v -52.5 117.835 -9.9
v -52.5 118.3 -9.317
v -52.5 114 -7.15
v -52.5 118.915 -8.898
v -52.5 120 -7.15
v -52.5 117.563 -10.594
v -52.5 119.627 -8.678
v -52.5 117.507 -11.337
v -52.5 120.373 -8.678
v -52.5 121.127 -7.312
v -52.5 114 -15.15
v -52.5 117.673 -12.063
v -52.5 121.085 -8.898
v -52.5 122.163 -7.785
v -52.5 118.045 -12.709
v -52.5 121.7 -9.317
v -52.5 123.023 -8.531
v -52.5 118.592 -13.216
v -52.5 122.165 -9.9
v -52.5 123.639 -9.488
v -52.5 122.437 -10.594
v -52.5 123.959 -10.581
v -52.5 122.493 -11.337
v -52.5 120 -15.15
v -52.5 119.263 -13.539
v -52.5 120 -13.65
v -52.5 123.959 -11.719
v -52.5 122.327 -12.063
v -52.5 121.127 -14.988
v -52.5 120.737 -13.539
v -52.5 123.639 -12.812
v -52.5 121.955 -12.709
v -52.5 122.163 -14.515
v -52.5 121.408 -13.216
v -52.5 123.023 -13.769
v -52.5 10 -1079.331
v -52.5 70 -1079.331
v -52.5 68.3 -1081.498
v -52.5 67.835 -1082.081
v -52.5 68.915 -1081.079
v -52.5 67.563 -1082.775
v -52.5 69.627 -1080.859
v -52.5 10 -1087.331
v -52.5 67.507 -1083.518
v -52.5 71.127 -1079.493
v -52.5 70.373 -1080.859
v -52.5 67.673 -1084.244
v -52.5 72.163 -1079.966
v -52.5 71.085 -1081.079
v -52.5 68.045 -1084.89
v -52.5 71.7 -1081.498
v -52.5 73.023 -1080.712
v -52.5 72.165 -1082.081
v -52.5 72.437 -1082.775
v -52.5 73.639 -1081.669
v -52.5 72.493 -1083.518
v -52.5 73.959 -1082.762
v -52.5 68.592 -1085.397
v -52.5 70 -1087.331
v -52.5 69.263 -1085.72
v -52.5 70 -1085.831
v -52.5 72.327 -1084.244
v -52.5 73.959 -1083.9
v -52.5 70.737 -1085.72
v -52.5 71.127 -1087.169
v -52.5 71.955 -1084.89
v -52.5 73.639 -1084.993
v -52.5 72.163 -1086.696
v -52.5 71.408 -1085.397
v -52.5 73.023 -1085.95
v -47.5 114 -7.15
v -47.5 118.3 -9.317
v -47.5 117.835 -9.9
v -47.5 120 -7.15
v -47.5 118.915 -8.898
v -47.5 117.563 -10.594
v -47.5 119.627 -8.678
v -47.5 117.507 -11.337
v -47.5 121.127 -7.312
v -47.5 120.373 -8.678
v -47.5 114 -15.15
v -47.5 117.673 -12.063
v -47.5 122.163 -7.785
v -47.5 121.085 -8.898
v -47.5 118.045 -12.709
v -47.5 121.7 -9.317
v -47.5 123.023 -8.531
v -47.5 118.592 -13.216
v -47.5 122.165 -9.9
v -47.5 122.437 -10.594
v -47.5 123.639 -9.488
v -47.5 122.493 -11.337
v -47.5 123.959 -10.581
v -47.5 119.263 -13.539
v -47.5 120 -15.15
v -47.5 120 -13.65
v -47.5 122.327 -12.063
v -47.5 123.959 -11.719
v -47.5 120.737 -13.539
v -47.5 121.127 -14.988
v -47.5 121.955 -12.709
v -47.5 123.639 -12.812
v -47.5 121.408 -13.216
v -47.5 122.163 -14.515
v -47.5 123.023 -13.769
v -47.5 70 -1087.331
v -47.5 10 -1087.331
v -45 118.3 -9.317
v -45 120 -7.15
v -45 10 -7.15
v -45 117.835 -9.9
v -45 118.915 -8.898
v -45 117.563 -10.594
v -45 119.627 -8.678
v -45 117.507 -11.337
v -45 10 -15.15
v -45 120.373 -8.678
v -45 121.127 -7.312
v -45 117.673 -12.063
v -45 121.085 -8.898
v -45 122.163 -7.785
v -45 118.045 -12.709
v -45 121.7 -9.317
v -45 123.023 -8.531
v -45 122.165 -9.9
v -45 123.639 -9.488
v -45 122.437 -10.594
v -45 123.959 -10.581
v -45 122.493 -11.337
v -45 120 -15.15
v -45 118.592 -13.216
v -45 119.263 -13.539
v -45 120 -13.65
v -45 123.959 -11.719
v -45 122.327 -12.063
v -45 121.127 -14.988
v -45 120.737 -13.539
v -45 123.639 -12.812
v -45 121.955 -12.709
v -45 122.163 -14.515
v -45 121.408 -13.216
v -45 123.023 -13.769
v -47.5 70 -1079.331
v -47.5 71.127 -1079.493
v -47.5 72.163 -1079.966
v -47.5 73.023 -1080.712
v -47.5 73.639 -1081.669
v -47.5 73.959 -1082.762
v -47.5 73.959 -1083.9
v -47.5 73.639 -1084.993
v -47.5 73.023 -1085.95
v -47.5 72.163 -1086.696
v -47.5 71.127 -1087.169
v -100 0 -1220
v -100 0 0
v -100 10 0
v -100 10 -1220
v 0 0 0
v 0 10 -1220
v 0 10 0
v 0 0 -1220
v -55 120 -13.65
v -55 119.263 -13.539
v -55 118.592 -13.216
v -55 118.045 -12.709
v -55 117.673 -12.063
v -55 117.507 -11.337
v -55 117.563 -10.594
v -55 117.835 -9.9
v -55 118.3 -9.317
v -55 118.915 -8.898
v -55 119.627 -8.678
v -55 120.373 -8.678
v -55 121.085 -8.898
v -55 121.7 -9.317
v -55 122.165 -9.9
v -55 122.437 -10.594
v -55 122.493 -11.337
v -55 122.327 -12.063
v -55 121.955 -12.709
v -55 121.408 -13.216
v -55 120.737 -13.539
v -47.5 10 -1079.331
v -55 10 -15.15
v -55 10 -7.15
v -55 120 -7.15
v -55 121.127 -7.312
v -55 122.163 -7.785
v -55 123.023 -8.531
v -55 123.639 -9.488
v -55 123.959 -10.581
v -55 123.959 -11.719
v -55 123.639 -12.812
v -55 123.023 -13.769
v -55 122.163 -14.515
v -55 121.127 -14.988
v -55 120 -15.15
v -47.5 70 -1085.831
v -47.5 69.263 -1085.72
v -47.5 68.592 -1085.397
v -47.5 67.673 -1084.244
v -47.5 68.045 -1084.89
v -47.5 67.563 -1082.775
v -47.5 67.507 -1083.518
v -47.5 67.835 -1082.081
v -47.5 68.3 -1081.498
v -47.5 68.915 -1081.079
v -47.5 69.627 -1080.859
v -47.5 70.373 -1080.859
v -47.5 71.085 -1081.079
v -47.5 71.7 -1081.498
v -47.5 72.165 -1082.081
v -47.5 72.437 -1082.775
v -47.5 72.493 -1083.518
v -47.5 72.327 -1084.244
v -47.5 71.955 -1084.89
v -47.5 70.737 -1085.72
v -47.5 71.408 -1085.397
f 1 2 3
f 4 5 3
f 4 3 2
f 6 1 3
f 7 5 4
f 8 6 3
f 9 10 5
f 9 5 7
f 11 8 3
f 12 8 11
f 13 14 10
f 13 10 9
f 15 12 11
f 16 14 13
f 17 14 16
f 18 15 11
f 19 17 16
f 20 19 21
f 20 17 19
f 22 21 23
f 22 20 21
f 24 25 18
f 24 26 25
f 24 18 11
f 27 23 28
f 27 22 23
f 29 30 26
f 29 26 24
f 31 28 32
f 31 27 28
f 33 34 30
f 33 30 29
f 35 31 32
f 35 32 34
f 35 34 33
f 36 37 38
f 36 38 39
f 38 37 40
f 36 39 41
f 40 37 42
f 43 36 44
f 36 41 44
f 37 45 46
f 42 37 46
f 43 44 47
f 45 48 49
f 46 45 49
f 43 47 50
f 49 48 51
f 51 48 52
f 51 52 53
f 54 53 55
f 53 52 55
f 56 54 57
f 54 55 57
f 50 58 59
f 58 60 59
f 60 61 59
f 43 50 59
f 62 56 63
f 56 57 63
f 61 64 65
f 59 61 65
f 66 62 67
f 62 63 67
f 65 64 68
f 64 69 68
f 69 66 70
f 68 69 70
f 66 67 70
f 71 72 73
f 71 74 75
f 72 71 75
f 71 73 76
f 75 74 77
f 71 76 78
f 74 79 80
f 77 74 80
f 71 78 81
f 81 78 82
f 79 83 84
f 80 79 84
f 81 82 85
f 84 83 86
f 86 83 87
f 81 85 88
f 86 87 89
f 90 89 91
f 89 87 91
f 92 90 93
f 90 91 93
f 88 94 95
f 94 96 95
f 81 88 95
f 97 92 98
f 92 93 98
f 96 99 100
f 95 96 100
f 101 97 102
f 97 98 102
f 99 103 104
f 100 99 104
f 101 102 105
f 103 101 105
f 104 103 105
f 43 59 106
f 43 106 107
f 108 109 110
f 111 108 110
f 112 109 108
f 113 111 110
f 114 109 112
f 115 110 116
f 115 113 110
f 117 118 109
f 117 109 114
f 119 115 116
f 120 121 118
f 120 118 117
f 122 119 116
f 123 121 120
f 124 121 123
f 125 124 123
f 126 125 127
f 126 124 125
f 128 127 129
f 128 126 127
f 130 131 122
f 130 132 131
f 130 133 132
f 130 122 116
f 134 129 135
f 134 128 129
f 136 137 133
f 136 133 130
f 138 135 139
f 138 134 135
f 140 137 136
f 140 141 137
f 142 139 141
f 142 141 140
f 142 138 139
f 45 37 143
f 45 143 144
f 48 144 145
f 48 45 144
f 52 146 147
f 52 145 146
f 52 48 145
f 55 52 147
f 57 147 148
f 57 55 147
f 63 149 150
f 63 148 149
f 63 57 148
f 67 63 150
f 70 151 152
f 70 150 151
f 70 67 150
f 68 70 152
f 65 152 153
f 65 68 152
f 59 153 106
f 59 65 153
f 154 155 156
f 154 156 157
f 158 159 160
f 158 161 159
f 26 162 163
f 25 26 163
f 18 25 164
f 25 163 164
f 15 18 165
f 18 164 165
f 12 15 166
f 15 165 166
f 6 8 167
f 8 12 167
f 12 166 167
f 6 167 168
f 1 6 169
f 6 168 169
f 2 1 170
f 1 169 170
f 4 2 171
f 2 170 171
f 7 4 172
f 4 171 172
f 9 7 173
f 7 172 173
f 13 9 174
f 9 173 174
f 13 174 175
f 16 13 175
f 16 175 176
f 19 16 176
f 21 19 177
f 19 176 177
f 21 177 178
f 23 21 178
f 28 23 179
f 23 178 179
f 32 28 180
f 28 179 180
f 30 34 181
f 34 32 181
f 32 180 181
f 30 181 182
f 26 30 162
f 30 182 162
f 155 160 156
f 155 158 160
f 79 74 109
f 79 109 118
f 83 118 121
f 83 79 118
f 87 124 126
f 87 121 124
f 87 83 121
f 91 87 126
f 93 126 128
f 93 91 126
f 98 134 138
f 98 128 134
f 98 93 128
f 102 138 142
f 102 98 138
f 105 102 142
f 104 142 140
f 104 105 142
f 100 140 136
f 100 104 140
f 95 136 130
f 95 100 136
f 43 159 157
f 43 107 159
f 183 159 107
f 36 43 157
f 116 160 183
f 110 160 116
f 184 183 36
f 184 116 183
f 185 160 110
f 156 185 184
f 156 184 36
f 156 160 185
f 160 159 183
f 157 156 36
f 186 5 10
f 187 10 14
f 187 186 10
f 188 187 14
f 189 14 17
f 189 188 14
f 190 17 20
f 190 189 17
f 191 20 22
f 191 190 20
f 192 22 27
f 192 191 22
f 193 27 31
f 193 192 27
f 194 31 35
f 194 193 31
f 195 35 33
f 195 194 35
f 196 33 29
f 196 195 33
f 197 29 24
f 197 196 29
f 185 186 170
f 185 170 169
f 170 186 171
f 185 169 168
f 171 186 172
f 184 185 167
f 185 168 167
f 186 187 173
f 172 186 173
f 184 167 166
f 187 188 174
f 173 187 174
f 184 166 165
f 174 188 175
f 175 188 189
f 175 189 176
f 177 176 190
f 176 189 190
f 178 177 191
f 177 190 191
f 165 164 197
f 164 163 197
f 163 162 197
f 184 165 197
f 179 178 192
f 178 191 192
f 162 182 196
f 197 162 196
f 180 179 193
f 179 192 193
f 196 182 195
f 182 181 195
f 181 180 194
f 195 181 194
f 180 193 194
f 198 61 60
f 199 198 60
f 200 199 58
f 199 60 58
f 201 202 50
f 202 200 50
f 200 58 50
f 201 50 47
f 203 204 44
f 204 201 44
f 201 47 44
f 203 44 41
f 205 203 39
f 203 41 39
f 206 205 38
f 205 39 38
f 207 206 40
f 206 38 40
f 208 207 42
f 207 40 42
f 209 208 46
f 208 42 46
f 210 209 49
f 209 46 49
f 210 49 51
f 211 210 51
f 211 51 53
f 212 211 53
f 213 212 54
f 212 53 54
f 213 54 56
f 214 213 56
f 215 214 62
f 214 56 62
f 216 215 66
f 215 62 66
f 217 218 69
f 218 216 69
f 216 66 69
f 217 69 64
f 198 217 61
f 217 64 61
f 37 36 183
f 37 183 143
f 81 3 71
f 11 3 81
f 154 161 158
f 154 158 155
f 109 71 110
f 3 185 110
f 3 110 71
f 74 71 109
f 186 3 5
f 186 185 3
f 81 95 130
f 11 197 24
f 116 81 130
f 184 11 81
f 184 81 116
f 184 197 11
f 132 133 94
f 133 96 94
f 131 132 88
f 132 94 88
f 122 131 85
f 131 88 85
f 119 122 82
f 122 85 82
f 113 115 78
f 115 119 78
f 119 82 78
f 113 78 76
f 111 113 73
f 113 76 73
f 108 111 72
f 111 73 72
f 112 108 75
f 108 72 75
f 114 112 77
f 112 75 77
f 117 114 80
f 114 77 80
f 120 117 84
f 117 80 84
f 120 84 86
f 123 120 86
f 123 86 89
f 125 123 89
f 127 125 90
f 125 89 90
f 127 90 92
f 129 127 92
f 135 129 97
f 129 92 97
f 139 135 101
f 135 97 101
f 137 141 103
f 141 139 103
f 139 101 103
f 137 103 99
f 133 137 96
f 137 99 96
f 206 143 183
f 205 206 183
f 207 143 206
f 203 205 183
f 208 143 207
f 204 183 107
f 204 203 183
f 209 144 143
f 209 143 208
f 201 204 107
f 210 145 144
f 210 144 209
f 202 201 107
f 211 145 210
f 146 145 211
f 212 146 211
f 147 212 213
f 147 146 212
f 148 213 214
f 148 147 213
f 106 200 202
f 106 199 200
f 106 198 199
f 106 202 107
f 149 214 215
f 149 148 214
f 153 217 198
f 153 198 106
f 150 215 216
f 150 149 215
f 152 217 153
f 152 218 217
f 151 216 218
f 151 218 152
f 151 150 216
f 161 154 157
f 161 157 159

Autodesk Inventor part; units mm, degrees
ref_plane "YZ Plane" through (0, 0, 0) normal (1, 0, 0) x (0, 1, 0)
ref_plane "XZ Plane" through (0, 0, 0) normal (0, 1, 0) x (-1, 0, 0)
ref_plane "XY Plane" through (0, 0, 0) normal (0, 0, 1) x (1, 0, 0)
sketch "Sketch1" plane through (0, 0, 0) normal (0, 1, 0) x (-1, 0, 0)
  line L0 (0, 0) -> (100, 0)
  line L1 (100, 0) -> (100, -1220)
  line L2 (100, -1220) -> (0, -1220)
  line L3 (0, -1220) -> (0, 0)
  dimension "d0" = 100
  dimension "d1" = 1220
extrude "Extrusion1" add sketch "Sketch1" along normal blind 10
ref_plane "Work Plane1" through (-50, 0, 0) normal (1, 0, 0) x (0, 0, -1)
sketch "Sketch2" plane through (-50, 0, 0) normal (1, 0, 0) x (0, 0, -1)
  line L0 (1220, 0) -> (0, 0) projected
  line L1 (1220, 0) -> (1220, 10) projected
  line L2 (0, 10) -> (1220, 10) projected
  line L3 (0, 0) -> (0, 10) projected
  line L4 (1220, 10) -> (1083.331, 10)
  line L5 (0, 10) -> (1220, 10) projected
  line L6 (1083.331, 10) -> (1183.331, 10) construction
  circle A0 centre (1083.331, 70) radius 2.5
  arc A1 (1087.331, 70) -> (1079.331, 70) centre (1083.331, 70) ccw
  line L7 (1087.331, 70) -> (1087.331, 10)
  line L8 (1087.331, 10) -> (1079.331, 10)
  line L9 (1079.331, 10) -> (1079.331, 70)
  dimension "d5" = 136.669
  dimension "d8" = 5
  dimension "d9" = 8
  dimension "d11" = 8
  dimension "d12" = 4
  dimension "d14" = 60
extrude "Extrusion2" add sketch "Sketch2" along normal mid plane 5 contours L2 L9 A1 L7
sketch "Sketch3" plane through (-50, 0, 0) normal (1, 0, 0) x (0, 0, -1)
  line L0 (1220, 0) -> (0, 0) projected
  line L1 (1220, 0) -> (1220, 10) projected
  line L2 (0, 10) -> (1220, 10) projected
  line L3 (0, 0) -> (0, 10) projected
  line L4 (1220, 10) -> (0, 10) projected
  line L5 (0, 10) -> (11.15, 10)
  circle A0 centre (11.15, 120) radius 2.5
  arc A1 (15.15, 120) -> (7.15, 120) centre (11.15, 120) ccw
  line L6 (15.15, 120) -> (15.15, 10)
  line L7 (15.15, 10) -> (7.15, 10)
  line L8 (7.15, 10) -> (7.15, 120)
  dimension "d18" = 11.15
  dimension "d21" = 5
  dimension "d22" = 8
  dimension "d24" = 8
  dimension "d31" = 110
extrude "Extrusion3" add sketch "Sketch3" along normal mid plane 10 contours L2 L8 A1 L6
sketch "Sketch4" plane through (-50, 0, 0) normal (1, 0, 0) x (0, 0, -1)
  arc A0 (15.15, 120) -> (7.15, 120) centre (11.15, 120) ccw projected
  circle A1 centre (11.15, 120) radius 2.5 projected
  line L0 (7.15, 120) -> (7.15, 10) projected
  line L1 (15.15, 124) -> (7.15, 124)
  line L2 (7.15, 124) -> (7.15, 114)
  line L3 (7.15, 114) -> (15.15, 114)
  line L4 (15.15, 114) -> (15.15, 124)
  point P0 (0, 0)
  dimension "d27" = 10
  dimension "d30" = 4
extrude "Extrusion4" cut sketch "Sketch4" along normal mid plane 5
equation "\"d12\" = 0.5 * d11"
properties part number "Base"
